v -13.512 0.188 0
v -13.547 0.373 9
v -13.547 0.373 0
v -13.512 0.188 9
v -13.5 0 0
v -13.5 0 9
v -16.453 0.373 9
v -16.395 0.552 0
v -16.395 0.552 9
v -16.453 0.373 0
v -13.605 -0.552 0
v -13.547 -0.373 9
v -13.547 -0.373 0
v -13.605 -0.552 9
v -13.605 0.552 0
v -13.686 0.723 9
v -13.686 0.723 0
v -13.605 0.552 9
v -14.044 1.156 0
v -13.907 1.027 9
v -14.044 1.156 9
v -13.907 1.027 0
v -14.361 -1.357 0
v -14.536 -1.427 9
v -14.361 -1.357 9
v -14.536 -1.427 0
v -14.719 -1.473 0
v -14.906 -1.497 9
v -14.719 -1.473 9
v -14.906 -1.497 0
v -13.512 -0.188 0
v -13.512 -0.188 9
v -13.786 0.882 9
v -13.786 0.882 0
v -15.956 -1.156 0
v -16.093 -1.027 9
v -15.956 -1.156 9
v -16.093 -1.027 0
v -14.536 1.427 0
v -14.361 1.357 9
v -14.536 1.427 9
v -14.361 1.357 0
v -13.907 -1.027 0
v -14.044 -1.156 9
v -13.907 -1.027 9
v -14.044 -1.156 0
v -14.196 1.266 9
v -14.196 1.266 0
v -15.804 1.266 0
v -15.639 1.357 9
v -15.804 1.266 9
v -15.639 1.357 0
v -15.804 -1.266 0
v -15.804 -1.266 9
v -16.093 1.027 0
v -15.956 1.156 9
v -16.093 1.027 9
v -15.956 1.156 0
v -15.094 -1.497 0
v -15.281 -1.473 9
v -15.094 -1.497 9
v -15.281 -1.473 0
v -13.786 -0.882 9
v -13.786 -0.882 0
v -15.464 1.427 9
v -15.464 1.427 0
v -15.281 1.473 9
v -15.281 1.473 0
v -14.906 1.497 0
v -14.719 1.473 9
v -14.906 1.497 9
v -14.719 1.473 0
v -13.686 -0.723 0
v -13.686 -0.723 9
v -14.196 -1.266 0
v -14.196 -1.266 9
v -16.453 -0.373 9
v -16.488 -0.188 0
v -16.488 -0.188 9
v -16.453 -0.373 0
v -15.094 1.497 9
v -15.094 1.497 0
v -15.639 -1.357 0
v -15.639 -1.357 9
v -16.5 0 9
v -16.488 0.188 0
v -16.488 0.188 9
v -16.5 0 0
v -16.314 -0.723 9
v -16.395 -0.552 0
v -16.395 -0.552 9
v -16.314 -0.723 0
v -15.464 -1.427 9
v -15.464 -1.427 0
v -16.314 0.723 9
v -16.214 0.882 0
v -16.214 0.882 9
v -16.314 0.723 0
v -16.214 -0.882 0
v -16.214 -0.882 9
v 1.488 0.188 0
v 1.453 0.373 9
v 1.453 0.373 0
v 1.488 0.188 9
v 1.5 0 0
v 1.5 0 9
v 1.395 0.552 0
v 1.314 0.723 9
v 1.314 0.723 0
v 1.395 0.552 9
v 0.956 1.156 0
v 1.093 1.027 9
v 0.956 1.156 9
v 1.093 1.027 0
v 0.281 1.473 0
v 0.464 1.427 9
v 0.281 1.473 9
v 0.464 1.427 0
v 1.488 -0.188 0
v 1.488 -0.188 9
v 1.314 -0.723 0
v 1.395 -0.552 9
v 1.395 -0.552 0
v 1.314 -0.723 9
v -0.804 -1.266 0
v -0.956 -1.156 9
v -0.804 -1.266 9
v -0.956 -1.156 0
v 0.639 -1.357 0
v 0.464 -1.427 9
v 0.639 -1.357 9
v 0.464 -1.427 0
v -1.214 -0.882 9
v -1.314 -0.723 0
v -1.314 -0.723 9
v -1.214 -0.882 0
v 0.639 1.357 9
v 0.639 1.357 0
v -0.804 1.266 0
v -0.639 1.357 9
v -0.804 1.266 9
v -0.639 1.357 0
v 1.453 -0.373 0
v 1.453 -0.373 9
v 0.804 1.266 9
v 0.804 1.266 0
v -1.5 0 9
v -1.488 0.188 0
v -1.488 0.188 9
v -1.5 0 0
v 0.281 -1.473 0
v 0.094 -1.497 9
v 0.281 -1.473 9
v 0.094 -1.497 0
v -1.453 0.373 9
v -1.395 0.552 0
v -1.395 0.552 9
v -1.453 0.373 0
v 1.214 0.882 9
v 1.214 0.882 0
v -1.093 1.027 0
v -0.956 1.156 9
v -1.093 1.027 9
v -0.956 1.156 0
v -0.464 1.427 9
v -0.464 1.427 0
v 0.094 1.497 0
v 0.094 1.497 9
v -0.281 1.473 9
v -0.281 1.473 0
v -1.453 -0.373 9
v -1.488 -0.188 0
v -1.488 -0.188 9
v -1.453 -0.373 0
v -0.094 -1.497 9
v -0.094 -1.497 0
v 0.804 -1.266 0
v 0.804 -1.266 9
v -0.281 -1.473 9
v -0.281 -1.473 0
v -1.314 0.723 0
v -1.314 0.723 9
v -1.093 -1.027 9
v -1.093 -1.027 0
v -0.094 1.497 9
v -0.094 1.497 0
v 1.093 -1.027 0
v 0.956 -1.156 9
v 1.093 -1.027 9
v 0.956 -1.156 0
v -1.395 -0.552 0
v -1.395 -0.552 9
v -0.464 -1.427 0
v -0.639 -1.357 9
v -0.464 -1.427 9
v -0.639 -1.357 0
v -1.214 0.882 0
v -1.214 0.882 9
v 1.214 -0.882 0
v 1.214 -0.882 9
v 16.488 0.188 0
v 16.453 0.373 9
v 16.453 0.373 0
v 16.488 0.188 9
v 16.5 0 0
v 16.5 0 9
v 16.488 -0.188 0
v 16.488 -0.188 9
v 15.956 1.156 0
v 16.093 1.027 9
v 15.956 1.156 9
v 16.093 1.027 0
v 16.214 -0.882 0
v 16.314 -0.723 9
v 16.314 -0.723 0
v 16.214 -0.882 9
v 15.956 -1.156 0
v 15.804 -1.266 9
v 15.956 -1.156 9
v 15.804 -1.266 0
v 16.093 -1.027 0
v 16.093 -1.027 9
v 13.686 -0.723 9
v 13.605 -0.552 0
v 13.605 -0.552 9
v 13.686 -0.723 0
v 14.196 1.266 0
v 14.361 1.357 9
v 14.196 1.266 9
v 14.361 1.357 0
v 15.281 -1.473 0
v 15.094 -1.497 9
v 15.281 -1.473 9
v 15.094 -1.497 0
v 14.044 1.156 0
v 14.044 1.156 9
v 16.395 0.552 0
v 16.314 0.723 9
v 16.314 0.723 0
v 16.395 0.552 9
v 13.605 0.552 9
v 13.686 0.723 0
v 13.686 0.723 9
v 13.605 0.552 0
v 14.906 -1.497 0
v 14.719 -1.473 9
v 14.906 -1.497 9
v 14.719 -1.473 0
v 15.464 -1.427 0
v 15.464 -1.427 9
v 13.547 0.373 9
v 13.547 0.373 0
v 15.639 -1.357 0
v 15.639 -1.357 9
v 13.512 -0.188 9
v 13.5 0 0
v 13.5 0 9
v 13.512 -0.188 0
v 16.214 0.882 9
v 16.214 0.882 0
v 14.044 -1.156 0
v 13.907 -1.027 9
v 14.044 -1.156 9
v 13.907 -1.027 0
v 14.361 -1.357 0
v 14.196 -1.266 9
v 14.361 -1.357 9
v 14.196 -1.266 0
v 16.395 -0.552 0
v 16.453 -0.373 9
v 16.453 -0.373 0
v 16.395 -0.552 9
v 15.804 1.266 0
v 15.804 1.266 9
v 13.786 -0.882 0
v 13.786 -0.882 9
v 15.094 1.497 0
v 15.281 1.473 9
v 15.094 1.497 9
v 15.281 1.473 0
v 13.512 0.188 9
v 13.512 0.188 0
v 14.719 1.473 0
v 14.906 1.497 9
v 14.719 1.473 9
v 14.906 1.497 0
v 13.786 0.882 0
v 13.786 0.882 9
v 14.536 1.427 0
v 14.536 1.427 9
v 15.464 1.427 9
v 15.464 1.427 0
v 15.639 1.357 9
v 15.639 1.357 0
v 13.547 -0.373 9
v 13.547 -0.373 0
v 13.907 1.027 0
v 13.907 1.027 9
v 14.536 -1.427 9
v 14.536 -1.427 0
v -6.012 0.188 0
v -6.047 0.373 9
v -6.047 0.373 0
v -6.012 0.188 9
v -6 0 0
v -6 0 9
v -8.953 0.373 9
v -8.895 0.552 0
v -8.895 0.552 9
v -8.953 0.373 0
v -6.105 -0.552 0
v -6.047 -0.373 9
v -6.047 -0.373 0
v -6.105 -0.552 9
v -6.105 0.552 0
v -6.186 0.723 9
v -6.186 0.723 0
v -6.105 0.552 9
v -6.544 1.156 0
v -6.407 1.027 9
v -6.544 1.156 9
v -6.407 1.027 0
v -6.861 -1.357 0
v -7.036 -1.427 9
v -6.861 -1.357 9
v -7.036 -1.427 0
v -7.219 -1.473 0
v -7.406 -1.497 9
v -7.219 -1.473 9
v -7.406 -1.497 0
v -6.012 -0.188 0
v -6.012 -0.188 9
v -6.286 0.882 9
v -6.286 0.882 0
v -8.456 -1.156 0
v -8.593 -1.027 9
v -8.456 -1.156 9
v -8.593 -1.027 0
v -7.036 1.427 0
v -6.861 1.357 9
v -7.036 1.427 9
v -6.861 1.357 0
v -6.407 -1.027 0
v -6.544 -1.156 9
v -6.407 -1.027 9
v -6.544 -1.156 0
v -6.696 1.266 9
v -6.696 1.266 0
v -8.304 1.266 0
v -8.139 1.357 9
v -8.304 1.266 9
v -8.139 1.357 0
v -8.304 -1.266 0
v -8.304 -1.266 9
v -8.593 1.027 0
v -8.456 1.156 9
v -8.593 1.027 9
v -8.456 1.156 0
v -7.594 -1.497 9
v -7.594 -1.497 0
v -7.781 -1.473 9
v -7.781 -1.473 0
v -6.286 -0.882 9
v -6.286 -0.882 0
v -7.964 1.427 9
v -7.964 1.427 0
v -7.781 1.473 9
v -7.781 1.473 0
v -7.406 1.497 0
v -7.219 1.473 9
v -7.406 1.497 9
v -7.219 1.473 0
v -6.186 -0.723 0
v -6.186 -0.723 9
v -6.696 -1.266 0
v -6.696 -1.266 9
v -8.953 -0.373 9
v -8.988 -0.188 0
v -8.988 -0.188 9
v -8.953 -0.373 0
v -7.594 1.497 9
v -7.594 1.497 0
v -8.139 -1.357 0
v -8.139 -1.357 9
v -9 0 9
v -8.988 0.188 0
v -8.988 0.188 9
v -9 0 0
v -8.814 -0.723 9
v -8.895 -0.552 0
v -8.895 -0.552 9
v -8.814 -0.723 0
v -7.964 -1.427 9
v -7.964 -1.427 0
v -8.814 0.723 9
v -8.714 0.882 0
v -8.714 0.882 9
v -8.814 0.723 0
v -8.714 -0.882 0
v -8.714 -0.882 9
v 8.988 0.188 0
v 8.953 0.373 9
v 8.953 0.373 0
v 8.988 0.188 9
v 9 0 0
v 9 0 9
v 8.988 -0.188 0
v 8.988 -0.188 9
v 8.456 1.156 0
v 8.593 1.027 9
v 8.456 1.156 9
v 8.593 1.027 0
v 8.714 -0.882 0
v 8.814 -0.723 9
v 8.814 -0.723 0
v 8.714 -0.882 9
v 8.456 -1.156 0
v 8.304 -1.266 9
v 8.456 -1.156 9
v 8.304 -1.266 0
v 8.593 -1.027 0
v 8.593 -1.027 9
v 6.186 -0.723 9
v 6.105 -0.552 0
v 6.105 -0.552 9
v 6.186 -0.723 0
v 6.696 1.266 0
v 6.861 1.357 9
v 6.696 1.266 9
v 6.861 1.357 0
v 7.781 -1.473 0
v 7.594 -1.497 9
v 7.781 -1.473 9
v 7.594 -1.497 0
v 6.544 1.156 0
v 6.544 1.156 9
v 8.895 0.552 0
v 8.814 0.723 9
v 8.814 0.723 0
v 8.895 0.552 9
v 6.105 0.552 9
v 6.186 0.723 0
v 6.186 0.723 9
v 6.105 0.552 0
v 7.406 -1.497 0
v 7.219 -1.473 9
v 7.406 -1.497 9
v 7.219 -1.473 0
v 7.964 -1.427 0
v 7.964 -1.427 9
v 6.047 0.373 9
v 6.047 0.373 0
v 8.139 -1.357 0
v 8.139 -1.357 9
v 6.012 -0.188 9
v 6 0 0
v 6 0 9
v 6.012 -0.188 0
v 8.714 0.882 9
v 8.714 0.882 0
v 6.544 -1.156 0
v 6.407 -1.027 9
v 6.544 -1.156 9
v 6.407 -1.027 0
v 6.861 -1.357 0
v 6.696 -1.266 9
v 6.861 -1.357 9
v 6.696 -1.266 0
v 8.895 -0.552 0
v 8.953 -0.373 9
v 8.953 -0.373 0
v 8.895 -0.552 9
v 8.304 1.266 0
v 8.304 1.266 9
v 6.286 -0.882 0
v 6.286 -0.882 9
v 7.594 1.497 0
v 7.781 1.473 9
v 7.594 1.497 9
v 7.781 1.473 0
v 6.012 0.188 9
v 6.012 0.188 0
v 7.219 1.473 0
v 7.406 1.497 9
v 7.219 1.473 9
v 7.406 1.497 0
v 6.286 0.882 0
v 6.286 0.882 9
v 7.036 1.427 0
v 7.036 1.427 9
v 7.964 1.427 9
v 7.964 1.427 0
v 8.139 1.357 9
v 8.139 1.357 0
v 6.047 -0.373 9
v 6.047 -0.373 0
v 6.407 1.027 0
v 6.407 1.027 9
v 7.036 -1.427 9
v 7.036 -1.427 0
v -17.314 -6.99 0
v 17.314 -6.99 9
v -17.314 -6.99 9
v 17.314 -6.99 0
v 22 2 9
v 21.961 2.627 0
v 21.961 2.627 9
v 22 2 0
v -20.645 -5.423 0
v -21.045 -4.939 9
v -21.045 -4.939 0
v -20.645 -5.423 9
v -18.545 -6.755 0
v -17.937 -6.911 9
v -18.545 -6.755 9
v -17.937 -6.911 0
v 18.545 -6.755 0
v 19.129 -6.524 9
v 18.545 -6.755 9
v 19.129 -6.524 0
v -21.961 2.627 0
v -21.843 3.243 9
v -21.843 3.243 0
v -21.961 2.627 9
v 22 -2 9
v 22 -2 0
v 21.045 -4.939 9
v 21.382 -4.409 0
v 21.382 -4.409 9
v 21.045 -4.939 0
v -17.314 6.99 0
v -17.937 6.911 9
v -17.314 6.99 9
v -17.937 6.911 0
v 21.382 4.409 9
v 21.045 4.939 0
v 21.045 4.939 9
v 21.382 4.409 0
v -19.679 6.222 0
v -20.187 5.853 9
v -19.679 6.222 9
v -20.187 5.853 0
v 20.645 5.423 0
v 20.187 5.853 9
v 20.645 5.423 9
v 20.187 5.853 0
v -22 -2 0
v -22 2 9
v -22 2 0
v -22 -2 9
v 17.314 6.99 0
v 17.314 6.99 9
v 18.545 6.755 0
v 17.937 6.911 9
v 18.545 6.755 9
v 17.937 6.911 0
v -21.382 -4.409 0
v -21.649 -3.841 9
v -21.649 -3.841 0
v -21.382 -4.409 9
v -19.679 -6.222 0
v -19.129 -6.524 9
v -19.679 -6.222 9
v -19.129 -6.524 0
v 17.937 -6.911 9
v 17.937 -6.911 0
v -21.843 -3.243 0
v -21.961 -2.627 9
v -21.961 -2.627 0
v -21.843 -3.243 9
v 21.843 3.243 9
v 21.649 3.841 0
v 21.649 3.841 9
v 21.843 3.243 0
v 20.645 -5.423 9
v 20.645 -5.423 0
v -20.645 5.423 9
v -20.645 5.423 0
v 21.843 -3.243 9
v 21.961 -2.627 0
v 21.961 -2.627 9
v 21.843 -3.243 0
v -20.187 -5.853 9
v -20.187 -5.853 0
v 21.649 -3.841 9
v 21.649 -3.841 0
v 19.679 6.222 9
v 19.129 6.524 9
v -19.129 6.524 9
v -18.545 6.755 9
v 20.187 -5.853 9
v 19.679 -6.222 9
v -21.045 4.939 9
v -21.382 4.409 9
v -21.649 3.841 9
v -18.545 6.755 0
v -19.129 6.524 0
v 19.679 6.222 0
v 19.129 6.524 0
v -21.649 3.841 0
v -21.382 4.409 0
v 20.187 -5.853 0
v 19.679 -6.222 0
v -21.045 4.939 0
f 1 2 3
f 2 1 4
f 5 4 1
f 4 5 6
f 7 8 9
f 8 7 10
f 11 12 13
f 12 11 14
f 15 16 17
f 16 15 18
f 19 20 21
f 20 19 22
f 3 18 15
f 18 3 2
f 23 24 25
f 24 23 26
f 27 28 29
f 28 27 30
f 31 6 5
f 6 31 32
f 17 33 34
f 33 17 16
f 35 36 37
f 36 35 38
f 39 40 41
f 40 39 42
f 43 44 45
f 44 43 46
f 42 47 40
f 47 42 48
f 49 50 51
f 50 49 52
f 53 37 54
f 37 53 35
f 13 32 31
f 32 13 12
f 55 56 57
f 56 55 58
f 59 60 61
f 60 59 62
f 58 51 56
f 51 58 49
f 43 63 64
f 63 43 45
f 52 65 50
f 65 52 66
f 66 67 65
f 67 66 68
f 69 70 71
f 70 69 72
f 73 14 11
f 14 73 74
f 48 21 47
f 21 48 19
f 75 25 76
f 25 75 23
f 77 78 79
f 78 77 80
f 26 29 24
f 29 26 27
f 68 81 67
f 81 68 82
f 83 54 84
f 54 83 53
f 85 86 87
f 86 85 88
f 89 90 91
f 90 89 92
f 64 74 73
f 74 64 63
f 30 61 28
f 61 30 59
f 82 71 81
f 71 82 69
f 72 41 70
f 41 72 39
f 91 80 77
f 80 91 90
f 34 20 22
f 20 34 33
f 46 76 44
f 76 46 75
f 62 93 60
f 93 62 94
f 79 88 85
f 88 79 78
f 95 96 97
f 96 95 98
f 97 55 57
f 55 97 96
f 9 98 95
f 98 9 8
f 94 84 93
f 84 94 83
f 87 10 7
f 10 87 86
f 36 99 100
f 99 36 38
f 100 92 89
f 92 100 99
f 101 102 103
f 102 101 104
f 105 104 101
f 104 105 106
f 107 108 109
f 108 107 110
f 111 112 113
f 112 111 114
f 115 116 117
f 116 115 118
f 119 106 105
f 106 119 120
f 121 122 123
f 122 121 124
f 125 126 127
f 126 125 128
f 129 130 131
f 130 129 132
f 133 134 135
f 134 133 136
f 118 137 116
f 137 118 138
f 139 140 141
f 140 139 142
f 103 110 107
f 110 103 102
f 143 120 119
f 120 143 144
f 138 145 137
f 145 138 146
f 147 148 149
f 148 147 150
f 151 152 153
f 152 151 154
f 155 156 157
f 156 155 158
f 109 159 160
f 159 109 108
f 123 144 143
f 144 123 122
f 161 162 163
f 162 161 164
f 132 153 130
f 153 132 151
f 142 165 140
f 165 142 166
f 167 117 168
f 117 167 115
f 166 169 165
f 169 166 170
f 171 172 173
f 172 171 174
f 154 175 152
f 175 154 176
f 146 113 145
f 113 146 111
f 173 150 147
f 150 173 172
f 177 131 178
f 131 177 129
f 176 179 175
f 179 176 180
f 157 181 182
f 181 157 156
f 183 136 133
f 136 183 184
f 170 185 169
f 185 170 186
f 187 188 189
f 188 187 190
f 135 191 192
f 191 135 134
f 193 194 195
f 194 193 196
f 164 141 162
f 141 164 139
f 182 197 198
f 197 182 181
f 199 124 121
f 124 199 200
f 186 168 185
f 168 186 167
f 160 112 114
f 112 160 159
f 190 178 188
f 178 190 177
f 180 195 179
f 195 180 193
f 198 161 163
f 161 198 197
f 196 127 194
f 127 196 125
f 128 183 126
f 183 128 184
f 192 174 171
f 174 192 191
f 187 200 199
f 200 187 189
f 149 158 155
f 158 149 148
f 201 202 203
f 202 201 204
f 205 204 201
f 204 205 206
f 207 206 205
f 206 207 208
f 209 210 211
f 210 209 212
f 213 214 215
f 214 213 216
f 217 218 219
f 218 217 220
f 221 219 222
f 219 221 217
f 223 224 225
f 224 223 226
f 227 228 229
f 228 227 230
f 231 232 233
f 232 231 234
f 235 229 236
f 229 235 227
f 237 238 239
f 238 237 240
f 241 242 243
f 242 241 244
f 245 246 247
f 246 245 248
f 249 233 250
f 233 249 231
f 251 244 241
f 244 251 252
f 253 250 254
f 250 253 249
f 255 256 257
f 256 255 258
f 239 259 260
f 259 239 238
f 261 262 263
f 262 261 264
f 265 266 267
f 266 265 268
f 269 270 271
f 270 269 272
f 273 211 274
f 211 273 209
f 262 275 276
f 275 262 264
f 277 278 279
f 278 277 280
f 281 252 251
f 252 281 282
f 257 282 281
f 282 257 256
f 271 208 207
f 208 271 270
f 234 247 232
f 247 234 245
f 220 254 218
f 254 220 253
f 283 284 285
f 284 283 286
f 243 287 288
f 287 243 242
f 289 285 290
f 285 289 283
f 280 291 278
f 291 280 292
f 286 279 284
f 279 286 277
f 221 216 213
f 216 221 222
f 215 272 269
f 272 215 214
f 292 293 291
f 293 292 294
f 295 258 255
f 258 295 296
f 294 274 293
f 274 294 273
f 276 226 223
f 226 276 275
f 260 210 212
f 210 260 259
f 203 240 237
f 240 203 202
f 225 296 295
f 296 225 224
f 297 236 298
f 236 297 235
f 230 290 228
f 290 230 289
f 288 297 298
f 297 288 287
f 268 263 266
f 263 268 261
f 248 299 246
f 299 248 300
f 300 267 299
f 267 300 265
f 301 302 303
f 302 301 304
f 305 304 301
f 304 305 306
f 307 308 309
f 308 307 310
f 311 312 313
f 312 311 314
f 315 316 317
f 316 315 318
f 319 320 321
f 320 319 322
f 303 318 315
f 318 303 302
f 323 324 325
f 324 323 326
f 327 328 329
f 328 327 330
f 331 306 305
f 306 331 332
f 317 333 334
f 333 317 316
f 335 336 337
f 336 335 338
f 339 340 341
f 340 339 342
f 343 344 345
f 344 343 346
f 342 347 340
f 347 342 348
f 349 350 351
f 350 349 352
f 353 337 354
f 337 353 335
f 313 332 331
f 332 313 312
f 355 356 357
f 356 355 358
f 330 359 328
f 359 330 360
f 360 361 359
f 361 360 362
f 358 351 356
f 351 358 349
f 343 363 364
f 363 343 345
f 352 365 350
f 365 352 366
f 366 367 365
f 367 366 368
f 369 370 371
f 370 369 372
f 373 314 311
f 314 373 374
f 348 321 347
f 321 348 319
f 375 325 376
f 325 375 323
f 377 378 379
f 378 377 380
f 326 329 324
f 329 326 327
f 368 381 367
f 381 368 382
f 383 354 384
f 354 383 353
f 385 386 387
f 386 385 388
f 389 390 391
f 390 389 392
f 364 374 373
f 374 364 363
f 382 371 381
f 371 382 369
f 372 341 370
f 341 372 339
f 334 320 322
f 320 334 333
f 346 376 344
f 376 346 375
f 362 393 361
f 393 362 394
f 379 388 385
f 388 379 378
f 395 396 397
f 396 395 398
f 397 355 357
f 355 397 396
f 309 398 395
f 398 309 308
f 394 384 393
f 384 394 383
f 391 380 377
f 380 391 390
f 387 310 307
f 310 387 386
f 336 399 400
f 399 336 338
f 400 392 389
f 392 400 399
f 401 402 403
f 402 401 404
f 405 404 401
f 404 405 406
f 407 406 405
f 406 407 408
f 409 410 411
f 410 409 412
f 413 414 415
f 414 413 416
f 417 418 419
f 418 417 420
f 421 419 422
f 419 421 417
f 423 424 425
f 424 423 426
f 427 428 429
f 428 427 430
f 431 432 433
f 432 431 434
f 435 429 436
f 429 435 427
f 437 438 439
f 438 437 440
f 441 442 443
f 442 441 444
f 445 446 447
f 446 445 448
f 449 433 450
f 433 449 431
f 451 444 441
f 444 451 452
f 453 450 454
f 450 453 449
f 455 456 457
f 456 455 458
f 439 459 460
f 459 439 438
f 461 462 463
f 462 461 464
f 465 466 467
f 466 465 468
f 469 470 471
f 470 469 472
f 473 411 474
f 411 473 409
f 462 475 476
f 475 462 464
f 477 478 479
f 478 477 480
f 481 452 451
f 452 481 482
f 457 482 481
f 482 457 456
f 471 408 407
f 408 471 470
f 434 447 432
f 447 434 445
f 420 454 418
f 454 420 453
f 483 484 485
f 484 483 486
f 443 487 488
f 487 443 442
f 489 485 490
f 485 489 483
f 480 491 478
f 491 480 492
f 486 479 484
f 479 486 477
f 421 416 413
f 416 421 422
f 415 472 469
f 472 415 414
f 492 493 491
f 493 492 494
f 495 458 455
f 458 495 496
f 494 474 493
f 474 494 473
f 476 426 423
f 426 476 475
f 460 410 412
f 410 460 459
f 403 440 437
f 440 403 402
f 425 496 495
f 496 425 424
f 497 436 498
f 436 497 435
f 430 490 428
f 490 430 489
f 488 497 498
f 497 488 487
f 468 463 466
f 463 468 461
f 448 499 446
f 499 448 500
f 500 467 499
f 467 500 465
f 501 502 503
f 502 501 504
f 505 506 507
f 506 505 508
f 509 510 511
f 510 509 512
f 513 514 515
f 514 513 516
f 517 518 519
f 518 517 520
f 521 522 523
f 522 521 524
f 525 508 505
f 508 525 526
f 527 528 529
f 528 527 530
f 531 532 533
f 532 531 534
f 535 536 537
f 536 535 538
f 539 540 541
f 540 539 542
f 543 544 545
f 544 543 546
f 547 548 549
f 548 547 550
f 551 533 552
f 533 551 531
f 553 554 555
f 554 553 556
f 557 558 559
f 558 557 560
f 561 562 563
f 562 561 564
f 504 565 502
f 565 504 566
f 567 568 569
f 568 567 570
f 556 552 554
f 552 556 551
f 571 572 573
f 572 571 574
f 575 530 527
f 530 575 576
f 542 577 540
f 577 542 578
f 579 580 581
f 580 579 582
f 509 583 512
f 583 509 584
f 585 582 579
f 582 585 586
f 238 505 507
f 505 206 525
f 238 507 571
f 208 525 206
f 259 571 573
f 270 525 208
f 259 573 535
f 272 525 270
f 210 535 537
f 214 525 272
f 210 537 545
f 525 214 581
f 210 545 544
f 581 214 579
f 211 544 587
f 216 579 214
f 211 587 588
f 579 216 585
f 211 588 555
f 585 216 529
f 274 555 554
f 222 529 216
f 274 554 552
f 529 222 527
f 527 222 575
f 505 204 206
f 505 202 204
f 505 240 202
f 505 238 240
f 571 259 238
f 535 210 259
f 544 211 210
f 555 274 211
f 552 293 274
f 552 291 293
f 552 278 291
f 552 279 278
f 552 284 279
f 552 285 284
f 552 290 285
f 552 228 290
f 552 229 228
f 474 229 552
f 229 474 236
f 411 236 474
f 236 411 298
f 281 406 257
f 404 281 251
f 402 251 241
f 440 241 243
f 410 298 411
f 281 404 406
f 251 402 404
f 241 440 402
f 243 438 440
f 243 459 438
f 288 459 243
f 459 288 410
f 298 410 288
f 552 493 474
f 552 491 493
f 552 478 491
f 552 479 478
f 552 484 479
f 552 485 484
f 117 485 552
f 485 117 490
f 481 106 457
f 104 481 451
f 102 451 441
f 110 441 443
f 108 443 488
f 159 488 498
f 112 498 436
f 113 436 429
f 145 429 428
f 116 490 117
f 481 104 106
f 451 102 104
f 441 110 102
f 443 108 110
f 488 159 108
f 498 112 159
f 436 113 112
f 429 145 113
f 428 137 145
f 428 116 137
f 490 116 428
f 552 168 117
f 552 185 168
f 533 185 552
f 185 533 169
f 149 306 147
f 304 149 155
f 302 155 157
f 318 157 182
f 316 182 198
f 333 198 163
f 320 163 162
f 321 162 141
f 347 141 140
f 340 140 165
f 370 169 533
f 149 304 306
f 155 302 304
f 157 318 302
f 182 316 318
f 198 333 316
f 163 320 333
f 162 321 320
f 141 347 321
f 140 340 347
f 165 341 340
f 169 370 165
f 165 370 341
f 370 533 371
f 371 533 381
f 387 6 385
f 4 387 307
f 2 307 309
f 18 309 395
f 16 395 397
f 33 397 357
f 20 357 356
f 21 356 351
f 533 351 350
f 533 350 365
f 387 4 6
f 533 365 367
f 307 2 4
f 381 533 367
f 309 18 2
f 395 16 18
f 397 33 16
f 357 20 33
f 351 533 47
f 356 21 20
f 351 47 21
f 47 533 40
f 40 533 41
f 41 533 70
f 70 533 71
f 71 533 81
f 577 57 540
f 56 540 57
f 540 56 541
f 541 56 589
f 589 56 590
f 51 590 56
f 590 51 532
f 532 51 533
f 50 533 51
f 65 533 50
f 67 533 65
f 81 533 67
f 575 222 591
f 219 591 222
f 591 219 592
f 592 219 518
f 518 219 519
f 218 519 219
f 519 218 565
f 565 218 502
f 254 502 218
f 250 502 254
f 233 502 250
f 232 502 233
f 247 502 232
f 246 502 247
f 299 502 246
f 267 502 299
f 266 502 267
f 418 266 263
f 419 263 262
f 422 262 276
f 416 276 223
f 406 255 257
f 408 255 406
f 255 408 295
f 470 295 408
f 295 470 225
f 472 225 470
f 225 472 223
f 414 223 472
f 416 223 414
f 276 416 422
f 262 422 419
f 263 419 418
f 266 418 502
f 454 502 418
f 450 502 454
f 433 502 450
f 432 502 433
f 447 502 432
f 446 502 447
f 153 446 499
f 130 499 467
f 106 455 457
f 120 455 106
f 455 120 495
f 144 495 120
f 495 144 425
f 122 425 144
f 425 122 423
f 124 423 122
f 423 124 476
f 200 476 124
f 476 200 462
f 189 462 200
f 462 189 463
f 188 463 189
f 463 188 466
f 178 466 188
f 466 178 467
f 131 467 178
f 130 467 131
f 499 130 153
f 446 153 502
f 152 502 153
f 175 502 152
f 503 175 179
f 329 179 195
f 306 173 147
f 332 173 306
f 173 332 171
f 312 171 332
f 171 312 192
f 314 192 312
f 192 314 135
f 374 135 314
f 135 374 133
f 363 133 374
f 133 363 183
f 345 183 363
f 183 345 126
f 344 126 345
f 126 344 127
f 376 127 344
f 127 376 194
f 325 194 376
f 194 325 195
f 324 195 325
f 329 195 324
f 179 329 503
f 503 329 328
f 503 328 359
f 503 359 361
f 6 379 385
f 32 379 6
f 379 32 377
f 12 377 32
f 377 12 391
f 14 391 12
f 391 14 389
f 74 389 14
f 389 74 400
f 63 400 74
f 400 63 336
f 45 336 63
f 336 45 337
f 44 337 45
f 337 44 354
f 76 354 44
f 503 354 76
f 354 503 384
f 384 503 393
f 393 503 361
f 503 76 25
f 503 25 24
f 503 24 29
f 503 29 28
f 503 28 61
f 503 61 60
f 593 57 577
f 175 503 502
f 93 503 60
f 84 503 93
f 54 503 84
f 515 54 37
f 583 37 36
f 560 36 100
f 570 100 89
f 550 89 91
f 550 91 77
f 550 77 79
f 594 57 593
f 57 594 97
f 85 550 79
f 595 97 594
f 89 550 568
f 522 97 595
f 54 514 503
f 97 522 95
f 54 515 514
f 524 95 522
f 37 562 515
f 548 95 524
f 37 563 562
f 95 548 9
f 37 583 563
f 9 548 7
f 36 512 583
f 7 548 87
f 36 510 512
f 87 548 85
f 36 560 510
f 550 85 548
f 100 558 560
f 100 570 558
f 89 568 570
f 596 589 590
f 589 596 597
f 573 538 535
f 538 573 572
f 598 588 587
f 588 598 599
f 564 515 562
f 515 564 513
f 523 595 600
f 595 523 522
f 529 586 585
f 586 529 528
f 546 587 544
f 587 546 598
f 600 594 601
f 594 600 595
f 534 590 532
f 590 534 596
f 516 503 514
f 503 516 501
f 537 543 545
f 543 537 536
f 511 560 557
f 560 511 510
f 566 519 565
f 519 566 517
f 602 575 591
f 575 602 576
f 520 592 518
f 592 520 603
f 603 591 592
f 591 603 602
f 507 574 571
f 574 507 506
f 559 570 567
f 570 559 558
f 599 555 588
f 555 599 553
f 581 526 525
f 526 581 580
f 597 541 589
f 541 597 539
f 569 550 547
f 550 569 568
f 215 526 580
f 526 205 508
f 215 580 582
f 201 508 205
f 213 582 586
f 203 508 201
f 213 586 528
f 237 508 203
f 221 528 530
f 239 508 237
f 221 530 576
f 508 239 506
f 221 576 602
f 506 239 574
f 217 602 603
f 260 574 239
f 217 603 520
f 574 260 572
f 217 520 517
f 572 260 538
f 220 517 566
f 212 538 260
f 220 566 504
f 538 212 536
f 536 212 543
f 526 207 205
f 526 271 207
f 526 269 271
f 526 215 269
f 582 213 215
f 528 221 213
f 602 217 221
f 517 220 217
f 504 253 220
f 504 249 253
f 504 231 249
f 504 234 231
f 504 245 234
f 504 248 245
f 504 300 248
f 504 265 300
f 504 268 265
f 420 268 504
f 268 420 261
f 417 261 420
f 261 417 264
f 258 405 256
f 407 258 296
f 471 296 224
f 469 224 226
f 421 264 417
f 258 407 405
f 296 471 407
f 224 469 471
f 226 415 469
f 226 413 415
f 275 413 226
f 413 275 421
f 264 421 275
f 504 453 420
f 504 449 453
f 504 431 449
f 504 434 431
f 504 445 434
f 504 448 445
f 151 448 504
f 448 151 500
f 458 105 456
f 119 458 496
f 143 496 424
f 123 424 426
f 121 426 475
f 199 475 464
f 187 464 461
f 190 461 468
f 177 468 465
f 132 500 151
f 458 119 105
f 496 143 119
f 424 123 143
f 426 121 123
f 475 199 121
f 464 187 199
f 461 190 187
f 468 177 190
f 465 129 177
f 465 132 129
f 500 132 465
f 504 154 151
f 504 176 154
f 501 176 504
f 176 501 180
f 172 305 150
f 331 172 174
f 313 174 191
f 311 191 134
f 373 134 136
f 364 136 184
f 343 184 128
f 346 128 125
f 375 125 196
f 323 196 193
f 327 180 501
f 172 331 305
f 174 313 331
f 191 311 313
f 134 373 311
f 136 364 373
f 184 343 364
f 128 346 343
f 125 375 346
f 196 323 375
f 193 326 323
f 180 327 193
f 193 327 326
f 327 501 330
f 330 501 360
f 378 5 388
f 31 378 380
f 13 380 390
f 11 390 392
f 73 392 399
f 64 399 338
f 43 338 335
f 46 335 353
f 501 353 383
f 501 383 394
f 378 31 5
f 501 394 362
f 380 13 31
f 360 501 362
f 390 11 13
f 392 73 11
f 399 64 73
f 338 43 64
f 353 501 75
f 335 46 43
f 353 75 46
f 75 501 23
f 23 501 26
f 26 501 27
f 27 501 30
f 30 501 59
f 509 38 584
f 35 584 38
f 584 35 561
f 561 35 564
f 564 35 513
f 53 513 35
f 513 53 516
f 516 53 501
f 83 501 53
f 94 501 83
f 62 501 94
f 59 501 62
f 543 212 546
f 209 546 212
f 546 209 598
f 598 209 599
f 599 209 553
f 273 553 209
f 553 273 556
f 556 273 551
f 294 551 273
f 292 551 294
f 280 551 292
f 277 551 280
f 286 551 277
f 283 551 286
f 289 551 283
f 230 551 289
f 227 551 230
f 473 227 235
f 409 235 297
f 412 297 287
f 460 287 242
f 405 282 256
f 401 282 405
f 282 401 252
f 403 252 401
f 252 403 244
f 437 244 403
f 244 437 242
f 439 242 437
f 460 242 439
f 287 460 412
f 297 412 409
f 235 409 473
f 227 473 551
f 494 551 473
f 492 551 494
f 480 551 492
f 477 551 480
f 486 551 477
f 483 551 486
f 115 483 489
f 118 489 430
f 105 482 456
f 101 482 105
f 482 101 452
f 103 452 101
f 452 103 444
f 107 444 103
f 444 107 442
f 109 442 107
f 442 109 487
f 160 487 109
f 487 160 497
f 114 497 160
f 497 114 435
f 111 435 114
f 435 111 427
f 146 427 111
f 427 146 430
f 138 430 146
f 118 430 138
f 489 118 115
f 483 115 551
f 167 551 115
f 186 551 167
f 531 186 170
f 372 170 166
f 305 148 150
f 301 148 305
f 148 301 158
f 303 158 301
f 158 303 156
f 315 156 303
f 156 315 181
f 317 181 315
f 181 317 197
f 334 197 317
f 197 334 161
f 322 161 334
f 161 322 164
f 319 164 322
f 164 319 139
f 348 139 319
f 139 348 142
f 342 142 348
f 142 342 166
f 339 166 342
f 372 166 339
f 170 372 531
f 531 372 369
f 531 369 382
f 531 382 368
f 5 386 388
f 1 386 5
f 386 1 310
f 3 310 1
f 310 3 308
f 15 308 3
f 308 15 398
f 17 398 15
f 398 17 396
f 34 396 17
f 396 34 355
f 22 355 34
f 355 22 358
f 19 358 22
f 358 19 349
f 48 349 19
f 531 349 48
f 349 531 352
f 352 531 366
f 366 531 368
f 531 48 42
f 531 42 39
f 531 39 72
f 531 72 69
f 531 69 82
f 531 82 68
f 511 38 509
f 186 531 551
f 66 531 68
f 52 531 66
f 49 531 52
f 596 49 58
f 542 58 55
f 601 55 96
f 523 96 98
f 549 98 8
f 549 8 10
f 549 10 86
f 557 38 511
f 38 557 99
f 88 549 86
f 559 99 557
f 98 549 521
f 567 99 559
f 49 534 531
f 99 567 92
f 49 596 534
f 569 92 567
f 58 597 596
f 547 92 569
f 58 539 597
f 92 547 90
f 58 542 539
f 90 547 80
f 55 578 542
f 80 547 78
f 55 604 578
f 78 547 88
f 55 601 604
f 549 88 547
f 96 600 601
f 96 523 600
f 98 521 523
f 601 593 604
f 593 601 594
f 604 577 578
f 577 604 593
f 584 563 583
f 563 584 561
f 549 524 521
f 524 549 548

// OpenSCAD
$fn = 50;


difference() {
	union() {
		hull() {
			translate(v = [-17.0000000000, 2.0000000000, 0]) {
				cylinder(h = 9, r = 5);
			}
			translate(v = [17.0000000000, 2.0000000000, 0]) {
				cylinder(h = 9, r = 5);
			}
			translate(v = [-17.0000000000, -2.0000000000, 0]) {
				cylinder(h = 9, r = 5);
			}
			translate(v = [17.0000000000, -2.0000000000, 0]) {
				cylinder(h = 9, r = 5);
			}
		}
	}
	union() {
		translate(v = [-15.0000000000, 0.0000000000, 0]) {
			translate(v = [0, 0, -100]) {
				cylinder(h = 200, r = 1.5000000000);
			}
		}
		translate(v = [0, 0, -100]) {
			cylinder(h = 200, r = 1.5000000000);
		}
		translate(v = [15.0000000000, 0.0000000000, 0]) {
			translate(v = [0, 0, -100]) {
				cylinder(h = 200, r = 1.5000000000);
			}
		}
		translate(v = [-15.0000000000, 0.0000000000, 0]) {
			translate(v = [0, 0, -100]) {
				cylinder(h = 200, r = 1.5000000000);
			}
		}
		translate(v = [-7.5000000000, 0.0000000000, 0]) {
			translate(v = [0, 0, -100]) {
				cylinder(h = 200, r = 1.5000000000);
			}
		}
		translate(v = [0, 0, -100]) {
			cylinder(h = 200, r = 1.5000000000);
		}
		translate(v = [7.5000000000, 0.0000000000, 0]) {
			translate(v = [0, 0, -100]) {
				cylinder(h = 200, r = 1.5000000000);
			}
		}
		translate(v = [15.0000000000, 0.0000000000, 0]) {
			translate(v = [0, 0, -100]) {
				cylinder(h = 200, r = 1.5000000000);
			}
		}
	}
}
